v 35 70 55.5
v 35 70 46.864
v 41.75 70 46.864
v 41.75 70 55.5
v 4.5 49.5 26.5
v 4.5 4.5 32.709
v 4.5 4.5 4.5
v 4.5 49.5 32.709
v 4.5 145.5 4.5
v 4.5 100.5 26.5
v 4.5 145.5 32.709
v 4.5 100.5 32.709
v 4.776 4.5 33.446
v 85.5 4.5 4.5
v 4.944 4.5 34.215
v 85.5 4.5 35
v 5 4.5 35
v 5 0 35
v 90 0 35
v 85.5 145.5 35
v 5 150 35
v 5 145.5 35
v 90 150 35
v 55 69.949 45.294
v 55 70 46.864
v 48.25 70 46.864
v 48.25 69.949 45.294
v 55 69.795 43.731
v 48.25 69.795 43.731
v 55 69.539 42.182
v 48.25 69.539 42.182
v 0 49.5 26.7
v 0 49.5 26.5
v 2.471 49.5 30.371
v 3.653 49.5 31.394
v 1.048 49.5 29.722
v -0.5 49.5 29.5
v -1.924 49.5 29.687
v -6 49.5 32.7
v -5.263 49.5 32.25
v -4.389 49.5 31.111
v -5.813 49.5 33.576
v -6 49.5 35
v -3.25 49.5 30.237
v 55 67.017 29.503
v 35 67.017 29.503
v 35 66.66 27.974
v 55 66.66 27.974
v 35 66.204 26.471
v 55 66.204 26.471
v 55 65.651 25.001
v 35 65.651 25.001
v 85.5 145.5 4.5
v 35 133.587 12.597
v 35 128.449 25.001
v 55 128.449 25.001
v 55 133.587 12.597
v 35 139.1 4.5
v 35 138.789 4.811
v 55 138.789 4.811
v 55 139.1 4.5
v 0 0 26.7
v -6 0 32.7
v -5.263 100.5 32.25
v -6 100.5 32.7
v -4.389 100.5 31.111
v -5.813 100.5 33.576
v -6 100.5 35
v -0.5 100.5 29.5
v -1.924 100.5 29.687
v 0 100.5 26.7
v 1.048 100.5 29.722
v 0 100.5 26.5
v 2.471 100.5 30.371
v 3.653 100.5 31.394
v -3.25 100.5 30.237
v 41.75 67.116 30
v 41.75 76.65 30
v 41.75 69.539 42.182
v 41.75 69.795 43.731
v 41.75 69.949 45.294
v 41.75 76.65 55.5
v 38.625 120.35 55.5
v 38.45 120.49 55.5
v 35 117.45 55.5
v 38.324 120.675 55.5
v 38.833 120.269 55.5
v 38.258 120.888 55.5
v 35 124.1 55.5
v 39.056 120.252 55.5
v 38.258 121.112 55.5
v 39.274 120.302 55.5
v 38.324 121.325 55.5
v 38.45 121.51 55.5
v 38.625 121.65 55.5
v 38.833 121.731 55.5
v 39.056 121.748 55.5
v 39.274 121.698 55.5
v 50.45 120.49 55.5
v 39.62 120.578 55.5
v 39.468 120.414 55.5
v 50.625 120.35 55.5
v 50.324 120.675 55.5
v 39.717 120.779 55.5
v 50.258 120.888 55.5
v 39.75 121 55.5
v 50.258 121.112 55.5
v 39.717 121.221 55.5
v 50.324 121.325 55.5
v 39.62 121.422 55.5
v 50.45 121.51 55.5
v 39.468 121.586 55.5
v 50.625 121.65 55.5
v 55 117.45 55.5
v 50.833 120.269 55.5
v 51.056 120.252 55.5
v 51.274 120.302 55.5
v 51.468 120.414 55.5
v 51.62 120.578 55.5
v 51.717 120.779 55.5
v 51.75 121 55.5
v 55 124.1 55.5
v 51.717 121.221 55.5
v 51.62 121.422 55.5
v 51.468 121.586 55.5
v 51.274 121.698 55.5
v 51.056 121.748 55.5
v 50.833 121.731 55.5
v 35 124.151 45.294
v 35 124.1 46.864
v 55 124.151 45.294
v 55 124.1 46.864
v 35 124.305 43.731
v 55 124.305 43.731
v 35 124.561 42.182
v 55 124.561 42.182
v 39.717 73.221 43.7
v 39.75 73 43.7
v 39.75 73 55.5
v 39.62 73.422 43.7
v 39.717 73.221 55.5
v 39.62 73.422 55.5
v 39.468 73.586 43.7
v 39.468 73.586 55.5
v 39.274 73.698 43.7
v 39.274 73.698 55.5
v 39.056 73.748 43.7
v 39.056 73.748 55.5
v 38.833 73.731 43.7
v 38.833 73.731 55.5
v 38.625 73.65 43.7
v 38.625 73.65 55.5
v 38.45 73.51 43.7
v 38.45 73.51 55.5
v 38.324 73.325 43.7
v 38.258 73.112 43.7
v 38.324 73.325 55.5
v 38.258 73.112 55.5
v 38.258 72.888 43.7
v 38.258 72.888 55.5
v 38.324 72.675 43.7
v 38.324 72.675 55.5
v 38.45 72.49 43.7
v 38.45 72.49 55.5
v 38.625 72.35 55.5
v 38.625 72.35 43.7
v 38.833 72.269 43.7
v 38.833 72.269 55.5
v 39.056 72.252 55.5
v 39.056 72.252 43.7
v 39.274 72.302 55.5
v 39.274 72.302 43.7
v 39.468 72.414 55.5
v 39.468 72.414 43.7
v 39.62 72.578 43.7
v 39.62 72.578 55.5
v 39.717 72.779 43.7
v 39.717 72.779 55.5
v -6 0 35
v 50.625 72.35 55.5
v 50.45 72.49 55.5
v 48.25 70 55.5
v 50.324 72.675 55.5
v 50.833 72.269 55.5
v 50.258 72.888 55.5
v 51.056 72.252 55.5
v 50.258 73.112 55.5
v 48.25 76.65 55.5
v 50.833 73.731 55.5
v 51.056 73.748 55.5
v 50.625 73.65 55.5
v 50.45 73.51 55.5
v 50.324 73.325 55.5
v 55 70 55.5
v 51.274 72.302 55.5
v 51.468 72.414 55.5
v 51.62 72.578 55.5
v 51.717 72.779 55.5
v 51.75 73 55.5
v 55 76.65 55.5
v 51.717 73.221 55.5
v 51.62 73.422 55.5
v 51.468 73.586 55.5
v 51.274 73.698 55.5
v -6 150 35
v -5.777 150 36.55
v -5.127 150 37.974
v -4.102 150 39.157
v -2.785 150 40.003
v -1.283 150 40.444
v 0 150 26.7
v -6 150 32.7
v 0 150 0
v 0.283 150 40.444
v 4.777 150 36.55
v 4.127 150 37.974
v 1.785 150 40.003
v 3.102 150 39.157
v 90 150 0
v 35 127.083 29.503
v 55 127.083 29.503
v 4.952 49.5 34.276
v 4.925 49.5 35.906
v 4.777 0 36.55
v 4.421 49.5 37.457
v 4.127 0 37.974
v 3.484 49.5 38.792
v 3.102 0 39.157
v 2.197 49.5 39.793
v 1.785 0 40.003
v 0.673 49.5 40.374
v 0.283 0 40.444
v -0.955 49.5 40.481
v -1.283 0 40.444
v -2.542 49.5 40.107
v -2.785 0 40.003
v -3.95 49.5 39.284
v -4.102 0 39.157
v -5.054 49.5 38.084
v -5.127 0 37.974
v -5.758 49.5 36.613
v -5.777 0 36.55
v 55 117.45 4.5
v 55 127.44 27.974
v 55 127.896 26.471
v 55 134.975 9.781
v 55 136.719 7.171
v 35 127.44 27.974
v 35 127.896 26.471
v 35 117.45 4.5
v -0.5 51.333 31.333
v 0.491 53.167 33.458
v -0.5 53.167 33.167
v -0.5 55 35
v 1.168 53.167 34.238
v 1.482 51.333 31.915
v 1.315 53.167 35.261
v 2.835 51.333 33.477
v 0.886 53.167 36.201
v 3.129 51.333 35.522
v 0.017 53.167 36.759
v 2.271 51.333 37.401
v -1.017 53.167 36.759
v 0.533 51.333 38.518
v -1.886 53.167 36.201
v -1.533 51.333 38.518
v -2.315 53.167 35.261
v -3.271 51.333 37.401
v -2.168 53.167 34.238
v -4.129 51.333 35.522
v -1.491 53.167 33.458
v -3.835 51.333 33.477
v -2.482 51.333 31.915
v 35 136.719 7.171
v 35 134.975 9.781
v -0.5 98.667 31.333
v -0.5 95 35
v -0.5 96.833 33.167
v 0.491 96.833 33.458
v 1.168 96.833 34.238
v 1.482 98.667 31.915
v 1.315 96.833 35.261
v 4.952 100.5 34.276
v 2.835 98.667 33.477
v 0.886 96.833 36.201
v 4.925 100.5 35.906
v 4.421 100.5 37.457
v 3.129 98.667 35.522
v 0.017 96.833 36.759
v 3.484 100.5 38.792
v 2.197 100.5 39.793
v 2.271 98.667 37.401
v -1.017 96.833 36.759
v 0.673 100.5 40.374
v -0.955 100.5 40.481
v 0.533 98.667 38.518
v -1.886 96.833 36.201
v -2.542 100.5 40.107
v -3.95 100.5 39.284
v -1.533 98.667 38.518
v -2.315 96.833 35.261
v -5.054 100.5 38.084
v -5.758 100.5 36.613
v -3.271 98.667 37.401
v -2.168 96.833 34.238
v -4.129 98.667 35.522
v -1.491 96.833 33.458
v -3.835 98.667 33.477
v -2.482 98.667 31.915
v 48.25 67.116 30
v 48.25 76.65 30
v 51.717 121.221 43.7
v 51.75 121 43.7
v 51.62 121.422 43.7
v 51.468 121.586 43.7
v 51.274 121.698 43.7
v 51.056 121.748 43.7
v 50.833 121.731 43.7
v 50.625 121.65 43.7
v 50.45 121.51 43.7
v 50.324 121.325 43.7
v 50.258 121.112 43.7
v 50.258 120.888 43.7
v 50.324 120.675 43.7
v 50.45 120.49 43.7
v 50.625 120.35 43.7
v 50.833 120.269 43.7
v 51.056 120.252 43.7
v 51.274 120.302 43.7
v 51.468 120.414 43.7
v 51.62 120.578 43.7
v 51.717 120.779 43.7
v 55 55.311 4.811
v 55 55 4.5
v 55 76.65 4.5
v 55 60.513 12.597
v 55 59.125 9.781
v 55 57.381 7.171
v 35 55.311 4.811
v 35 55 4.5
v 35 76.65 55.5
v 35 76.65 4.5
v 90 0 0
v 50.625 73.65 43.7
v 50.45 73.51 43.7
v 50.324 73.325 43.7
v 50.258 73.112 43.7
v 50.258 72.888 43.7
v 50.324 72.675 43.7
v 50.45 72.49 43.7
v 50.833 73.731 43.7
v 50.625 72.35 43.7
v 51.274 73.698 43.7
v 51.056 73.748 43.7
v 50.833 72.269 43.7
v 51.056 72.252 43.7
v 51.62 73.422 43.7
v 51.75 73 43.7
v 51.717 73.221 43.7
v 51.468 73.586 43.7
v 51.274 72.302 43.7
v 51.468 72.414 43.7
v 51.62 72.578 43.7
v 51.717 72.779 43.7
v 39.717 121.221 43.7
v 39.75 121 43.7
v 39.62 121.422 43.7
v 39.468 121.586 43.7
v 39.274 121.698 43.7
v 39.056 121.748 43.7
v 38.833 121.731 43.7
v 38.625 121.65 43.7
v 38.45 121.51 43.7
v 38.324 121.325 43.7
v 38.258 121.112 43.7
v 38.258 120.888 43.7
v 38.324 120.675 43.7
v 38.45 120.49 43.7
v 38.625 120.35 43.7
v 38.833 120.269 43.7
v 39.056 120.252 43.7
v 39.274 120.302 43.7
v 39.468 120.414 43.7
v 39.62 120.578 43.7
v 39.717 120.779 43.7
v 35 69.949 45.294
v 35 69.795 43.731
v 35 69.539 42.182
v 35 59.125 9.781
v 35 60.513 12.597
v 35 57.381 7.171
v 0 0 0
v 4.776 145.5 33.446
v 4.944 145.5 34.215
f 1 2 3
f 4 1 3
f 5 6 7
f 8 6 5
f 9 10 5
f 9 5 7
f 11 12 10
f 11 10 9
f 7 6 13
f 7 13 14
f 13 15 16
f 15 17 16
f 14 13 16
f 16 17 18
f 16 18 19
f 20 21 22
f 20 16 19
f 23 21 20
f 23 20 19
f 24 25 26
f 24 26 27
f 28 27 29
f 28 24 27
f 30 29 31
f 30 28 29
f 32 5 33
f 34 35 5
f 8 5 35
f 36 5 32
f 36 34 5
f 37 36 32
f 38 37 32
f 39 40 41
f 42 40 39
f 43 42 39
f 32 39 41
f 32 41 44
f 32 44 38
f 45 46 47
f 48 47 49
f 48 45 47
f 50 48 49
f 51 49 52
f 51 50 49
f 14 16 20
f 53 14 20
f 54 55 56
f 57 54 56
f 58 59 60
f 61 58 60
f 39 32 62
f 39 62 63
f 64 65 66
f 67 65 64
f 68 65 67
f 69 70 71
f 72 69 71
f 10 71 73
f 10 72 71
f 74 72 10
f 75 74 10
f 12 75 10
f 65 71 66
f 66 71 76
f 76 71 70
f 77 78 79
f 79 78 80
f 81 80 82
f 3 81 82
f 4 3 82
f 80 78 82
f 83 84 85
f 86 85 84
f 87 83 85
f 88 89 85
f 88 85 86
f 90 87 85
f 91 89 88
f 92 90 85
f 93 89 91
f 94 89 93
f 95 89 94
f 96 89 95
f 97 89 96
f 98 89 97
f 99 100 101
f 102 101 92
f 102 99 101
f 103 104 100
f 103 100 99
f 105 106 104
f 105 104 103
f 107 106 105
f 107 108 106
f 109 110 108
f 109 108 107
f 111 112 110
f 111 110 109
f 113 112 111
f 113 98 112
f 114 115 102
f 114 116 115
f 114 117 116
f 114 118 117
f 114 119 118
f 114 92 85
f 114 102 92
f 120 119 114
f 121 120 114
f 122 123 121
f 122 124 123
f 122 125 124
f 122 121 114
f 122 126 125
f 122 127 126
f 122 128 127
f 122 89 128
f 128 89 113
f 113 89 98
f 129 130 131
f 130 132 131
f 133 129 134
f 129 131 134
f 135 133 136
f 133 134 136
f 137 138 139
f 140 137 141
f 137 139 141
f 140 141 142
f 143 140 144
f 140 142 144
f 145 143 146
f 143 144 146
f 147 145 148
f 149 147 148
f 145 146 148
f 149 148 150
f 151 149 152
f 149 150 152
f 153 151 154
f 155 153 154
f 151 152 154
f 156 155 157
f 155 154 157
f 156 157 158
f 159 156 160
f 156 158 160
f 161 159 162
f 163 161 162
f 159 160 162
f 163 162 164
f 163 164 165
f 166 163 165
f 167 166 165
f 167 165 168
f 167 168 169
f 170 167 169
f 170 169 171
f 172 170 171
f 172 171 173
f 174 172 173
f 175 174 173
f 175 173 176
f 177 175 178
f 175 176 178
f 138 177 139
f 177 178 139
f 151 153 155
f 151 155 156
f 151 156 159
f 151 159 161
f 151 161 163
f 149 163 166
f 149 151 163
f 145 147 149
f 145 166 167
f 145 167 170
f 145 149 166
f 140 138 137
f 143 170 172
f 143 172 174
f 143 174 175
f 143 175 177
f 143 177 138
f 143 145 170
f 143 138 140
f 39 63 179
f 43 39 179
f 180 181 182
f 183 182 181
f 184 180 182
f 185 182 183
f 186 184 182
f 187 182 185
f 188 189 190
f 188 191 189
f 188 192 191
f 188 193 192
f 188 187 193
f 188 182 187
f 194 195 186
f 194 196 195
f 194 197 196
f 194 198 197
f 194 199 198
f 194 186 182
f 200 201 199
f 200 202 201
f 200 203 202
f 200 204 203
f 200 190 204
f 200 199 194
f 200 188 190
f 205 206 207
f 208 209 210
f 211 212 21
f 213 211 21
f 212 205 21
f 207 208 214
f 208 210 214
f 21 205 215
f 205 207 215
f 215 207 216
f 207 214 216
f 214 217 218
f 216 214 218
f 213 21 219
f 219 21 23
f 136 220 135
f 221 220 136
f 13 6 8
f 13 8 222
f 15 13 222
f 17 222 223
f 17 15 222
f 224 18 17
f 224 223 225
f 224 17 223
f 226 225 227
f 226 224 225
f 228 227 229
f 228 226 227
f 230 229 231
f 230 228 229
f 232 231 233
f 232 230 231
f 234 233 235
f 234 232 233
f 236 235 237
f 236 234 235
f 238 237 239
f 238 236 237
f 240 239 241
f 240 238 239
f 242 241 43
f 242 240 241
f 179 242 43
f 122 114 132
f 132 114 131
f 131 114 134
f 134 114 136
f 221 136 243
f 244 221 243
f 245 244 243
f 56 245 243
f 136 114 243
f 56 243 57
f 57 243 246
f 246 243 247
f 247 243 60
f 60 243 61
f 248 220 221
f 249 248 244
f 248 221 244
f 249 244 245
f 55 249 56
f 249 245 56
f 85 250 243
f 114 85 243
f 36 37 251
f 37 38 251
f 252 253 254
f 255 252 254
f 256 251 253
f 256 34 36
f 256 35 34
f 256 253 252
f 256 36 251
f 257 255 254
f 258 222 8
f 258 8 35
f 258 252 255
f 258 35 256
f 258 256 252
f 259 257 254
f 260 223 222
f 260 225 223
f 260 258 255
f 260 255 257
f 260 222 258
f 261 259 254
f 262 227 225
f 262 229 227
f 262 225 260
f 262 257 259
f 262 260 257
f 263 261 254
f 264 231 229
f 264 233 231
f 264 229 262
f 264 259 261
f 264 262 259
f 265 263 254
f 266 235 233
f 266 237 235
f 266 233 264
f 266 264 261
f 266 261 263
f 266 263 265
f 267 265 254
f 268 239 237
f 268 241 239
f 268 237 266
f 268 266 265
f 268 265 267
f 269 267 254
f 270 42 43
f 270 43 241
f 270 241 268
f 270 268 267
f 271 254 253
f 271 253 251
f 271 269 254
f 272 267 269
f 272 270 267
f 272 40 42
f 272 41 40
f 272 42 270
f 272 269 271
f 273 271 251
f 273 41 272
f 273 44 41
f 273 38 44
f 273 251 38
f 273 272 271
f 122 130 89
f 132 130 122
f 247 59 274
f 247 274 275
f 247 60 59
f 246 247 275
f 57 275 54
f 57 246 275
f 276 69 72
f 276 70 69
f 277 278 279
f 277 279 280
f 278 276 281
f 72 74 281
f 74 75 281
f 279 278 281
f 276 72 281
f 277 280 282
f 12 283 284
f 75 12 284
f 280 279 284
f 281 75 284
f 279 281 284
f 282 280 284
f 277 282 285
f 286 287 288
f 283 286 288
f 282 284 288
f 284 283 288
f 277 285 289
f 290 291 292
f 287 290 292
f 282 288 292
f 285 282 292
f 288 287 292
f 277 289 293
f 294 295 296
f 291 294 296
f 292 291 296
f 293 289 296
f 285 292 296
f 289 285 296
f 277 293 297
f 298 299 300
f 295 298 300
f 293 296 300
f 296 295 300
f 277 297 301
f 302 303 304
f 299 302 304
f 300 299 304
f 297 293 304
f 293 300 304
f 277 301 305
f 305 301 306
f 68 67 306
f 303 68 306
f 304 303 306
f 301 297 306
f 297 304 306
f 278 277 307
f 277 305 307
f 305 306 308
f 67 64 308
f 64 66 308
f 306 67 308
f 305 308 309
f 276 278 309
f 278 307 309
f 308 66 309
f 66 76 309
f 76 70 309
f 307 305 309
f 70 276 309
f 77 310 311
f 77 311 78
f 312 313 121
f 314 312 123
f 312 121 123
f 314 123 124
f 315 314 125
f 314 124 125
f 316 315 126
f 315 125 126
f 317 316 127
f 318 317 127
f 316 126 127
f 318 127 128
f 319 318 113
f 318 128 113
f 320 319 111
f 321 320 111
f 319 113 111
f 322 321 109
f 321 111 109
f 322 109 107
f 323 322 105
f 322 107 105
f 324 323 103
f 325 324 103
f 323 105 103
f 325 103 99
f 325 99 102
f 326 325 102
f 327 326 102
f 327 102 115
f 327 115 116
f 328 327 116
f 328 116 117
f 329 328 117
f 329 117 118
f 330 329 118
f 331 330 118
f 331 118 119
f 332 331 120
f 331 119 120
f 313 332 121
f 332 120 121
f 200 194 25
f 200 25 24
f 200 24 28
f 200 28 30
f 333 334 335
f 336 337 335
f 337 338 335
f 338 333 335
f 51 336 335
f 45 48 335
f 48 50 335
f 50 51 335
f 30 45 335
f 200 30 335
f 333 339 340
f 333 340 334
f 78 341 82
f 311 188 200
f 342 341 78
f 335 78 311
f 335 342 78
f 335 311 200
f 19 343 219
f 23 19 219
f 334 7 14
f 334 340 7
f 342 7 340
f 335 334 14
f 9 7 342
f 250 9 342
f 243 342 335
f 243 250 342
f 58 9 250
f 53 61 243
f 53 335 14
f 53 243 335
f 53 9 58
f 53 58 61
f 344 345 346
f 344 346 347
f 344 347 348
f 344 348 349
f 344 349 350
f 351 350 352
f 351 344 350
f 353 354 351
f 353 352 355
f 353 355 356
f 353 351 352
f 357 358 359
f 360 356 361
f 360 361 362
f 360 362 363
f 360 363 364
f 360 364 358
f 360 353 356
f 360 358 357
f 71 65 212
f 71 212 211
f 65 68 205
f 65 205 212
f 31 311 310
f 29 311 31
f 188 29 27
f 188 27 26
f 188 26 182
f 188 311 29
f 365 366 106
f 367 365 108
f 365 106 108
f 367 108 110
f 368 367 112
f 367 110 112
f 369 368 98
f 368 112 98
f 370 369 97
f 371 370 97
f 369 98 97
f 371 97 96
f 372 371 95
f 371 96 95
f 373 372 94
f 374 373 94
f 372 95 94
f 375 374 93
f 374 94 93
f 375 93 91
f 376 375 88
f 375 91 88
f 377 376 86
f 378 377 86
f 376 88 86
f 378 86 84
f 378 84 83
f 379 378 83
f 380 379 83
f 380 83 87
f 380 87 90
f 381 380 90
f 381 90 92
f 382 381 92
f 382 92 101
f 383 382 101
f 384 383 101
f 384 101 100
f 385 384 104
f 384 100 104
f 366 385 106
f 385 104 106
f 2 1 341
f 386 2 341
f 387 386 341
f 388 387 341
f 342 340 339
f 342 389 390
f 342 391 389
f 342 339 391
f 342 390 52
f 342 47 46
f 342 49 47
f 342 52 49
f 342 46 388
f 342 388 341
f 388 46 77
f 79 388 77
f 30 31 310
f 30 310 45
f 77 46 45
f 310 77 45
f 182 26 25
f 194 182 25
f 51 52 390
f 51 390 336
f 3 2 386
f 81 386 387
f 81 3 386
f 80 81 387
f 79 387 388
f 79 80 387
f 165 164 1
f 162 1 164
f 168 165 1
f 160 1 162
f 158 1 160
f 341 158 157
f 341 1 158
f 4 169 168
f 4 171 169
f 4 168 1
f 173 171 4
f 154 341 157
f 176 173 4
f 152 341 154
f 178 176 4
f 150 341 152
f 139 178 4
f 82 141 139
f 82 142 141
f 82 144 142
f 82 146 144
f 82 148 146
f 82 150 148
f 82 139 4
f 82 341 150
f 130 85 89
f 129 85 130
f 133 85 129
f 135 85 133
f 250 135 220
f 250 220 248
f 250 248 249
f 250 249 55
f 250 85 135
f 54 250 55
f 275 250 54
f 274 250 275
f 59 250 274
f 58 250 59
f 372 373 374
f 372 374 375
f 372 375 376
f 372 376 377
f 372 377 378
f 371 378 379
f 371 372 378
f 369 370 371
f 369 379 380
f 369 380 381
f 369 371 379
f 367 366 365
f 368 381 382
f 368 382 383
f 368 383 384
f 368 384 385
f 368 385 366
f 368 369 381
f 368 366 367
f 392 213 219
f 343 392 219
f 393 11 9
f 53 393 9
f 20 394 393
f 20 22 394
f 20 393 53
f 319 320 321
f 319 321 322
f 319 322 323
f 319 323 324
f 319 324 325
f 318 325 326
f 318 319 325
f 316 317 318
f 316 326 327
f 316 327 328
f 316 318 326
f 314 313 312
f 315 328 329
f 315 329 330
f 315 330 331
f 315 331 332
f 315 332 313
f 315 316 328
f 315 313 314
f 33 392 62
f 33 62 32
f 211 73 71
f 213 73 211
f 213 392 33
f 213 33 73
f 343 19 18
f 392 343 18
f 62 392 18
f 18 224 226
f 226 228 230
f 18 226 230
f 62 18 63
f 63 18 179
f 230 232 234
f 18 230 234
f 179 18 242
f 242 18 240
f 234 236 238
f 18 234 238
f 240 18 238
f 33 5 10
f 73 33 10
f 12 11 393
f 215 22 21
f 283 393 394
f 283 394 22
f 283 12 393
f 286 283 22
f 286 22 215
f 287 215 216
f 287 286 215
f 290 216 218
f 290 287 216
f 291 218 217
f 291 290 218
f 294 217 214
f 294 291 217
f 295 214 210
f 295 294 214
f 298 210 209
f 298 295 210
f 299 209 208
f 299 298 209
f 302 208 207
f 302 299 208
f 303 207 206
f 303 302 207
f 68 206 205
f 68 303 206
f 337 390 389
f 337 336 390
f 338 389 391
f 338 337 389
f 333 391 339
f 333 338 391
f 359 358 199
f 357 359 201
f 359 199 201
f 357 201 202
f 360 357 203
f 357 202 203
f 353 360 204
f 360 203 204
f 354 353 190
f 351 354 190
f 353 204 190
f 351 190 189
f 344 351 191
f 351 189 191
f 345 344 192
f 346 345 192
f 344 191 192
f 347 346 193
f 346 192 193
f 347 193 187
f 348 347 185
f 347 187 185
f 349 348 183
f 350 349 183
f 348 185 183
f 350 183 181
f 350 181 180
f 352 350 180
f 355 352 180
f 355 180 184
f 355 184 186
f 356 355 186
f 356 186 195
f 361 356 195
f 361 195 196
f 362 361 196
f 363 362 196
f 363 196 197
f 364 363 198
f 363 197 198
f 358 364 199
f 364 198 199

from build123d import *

# Parameters (mm, degrees)
SKETCH008_W     = 90
SKETCH008_H     = 150
PAD003_DEPTH    = 35
SKETCH009_W     = 81
SKETCH009_H     = 141
POCKET003_DEPTH = 30.5
SKETCH013_R     = 5.5
PAD006_DEPTH    = 150
SKETCH014_W     = 51
SKETCH014_H     = 14
POCKET005_DEPTH = 6
PAD008_DEPTH    = 49.5
PAD009_DEPTH    = 49.5
SKETCH021_W     = 20
SKETCH021_H     = 6.65
PAD010_DEPTH    = 51
CHAMFER001_SIZE = 15
SKETCH022_R     = 0.75
POCKET007_DEPTH = 11.8
CHAMFER002_SIZE = 16
CHAMFER003_SIZE = 9
FILLET001_R     = 24
SKETCH023_W     = 6.5
SKETCH023_H     = 25.5
POCKET008_DEPTH = 16


with BuildPart() as part:
    # Sketch008 → Pad003 (new body)
    with BuildSketch(Plane.XY):
        with Locations((45, 75)):
            Rectangle(SKETCH008_W, SKETCH008_H)
    extrude(amount=PAD003_DEPTH)

    # Sketch009 (on Face6 of Pad003) → Pocket003 (cut)
    with BuildSketch(Plane.XY.offset(35)):
        with Locations((45, 75)):
            Rectangle(SKETCH009_W, SKETCH009_H)
    extrude(amount=-POCKET003_DEPTH, mode=Mode.SUBTRACT)

    # Sketch013 → Pad006 (join)
    with BuildSketch(Plane.XZ):
        with Locations((-0.5, 35)):
            Circle(SKETCH013_R)
    extrude(amount=-PAD006_DEPTH)

    # Sketch014 → Pocket005 (cut, symmetric)
    with BuildSketch(Plane.YZ):
        with Locations((75, 33.5)):
            Rectangle(SKETCH014_W, SKETCH014_H)
    extrude(amount=POCKET005_DEPTH, both=True, mode=Mode.SUBTRACT)

    # Sketch017 (on Face13 of Pocket005) → Pad008 (join)
    with BuildSketch(Plane.XZ):
        Polygon((0, 26.7), (-6, 32.7), (-6, 35), (0, 35), align=None)
    extrude(amount=-PAD008_DEPTH)

    # Sketch018 (on Face19 of Pad008) → Pad009 (join)
    with BuildSketch(Plane.XZ.offset(-100.5)):
        Polygon((0, 26.7), (0, 35), (-6, 35), (-6, 32.7), align=None)
    extrude(amount=-PAD009_DEPTH)

    # Sketch019 (on DatumPlane) → Revolution (revolve)
    with BuildSketch(Plane(origin=(-0.5, 100.5, 0), x_dir=(0, 1, 0), z_dir=(1, 0, 0))):
        Polygon((0, 35), (-5.5, 35), (0, 29.5), align=None)
        Polygon((-51, 35), (-45.5, 35), (-51, 29.5), align=None)
    revolve(axis=Axis((-0.5, 100.5, 35), (0, -1, 0)))

    # Sketch021 (on Face26 of Revolution) → Pad010 (join)
    with BuildSketch(Plane.XY.offset(4.5)):
        with Locations((45, 120.775)):
            Rectangle(SKETCH021_W, SKETCH021_H)
        with Locations((45, 73.325)):
            Rectangle(SKETCH021_W, SKETCH021_H)
    extrude(amount=PAD010_DEPTH)

    # Chamfer001
    chamfer001_edges = [part.edges().sort_by_distance(p)[0] for p in [
        (45, 70, 4.5),
        (45, 124.1, 4.5),
    ]]
    chamfer(chamfer001_edges, length=CHAMFER001_SIZE)

    # Sketch022 (on Face23 of Chamfer001) → Pocket007 (cut)
    with BuildSketch(Plane.XY.offset(55.5)):
        with Locations((39, 121)):
            Circle(SKETCH022_R)
        with Locations((51, 121)):
            Circle(SKETCH022_R)
        with Locations((39, 73)):
            Circle(SKETCH022_R)
        with Locations((51, 73)):
            Circle(SKETCH022_R)
    extrude(amount=-POCKET007_DEPTH, mode=Mode.SUBTRACT)

    # Chamfer002
    chamfer002_edges = [part.edges().sort_by_distance(p)[0] for p in [
        (45, 70, 19.5),
        (45, 124.1, 19.5),
    ]]
    chamfer(chamfer002_edges, length=CHAMFER002_SIZE)

    # Chamfer003
    chamfer003_edges = [part.edges().sort_by_distance(p)[0] for p in [
        (45, 70, 35.5),
        (45, 124.1, 35.5),
    ]]
    chamfer(chamfer003_edges, length=CHAMFER003_SIZE)

    # Fillet001
    fillet001_edges = [part.edges().sort_by_distance(p)[0] for p in [
        (45, 124.1, 44.5),
        (45, 127.544151, 27.185084),
        (45, 135.413708, 8.186292),
        (45, 58.686292, 8.186292),
        (45, 66.555849, 27.185084),
        (45, 70, 44.5),
    ]]
    fillet(fillet001_edges, radius=FILLET001_R)

    # Sketch023 (on Face6 of Fillet001) → Pocket008 (cut)
    with BuildSketch(Plane(origin=(0, 76.65, 0), x_dir=(-1, 0, 0), z_dir=(0, 1, 0))):
        with Locations((-45, 42.75)):
            Rectangle(SKETCH023_W, SKETCH023_H)
    extrude(amount=-POCKET008_DEPTH, mode=Mode.SUBTRACT)


solid = part.part
